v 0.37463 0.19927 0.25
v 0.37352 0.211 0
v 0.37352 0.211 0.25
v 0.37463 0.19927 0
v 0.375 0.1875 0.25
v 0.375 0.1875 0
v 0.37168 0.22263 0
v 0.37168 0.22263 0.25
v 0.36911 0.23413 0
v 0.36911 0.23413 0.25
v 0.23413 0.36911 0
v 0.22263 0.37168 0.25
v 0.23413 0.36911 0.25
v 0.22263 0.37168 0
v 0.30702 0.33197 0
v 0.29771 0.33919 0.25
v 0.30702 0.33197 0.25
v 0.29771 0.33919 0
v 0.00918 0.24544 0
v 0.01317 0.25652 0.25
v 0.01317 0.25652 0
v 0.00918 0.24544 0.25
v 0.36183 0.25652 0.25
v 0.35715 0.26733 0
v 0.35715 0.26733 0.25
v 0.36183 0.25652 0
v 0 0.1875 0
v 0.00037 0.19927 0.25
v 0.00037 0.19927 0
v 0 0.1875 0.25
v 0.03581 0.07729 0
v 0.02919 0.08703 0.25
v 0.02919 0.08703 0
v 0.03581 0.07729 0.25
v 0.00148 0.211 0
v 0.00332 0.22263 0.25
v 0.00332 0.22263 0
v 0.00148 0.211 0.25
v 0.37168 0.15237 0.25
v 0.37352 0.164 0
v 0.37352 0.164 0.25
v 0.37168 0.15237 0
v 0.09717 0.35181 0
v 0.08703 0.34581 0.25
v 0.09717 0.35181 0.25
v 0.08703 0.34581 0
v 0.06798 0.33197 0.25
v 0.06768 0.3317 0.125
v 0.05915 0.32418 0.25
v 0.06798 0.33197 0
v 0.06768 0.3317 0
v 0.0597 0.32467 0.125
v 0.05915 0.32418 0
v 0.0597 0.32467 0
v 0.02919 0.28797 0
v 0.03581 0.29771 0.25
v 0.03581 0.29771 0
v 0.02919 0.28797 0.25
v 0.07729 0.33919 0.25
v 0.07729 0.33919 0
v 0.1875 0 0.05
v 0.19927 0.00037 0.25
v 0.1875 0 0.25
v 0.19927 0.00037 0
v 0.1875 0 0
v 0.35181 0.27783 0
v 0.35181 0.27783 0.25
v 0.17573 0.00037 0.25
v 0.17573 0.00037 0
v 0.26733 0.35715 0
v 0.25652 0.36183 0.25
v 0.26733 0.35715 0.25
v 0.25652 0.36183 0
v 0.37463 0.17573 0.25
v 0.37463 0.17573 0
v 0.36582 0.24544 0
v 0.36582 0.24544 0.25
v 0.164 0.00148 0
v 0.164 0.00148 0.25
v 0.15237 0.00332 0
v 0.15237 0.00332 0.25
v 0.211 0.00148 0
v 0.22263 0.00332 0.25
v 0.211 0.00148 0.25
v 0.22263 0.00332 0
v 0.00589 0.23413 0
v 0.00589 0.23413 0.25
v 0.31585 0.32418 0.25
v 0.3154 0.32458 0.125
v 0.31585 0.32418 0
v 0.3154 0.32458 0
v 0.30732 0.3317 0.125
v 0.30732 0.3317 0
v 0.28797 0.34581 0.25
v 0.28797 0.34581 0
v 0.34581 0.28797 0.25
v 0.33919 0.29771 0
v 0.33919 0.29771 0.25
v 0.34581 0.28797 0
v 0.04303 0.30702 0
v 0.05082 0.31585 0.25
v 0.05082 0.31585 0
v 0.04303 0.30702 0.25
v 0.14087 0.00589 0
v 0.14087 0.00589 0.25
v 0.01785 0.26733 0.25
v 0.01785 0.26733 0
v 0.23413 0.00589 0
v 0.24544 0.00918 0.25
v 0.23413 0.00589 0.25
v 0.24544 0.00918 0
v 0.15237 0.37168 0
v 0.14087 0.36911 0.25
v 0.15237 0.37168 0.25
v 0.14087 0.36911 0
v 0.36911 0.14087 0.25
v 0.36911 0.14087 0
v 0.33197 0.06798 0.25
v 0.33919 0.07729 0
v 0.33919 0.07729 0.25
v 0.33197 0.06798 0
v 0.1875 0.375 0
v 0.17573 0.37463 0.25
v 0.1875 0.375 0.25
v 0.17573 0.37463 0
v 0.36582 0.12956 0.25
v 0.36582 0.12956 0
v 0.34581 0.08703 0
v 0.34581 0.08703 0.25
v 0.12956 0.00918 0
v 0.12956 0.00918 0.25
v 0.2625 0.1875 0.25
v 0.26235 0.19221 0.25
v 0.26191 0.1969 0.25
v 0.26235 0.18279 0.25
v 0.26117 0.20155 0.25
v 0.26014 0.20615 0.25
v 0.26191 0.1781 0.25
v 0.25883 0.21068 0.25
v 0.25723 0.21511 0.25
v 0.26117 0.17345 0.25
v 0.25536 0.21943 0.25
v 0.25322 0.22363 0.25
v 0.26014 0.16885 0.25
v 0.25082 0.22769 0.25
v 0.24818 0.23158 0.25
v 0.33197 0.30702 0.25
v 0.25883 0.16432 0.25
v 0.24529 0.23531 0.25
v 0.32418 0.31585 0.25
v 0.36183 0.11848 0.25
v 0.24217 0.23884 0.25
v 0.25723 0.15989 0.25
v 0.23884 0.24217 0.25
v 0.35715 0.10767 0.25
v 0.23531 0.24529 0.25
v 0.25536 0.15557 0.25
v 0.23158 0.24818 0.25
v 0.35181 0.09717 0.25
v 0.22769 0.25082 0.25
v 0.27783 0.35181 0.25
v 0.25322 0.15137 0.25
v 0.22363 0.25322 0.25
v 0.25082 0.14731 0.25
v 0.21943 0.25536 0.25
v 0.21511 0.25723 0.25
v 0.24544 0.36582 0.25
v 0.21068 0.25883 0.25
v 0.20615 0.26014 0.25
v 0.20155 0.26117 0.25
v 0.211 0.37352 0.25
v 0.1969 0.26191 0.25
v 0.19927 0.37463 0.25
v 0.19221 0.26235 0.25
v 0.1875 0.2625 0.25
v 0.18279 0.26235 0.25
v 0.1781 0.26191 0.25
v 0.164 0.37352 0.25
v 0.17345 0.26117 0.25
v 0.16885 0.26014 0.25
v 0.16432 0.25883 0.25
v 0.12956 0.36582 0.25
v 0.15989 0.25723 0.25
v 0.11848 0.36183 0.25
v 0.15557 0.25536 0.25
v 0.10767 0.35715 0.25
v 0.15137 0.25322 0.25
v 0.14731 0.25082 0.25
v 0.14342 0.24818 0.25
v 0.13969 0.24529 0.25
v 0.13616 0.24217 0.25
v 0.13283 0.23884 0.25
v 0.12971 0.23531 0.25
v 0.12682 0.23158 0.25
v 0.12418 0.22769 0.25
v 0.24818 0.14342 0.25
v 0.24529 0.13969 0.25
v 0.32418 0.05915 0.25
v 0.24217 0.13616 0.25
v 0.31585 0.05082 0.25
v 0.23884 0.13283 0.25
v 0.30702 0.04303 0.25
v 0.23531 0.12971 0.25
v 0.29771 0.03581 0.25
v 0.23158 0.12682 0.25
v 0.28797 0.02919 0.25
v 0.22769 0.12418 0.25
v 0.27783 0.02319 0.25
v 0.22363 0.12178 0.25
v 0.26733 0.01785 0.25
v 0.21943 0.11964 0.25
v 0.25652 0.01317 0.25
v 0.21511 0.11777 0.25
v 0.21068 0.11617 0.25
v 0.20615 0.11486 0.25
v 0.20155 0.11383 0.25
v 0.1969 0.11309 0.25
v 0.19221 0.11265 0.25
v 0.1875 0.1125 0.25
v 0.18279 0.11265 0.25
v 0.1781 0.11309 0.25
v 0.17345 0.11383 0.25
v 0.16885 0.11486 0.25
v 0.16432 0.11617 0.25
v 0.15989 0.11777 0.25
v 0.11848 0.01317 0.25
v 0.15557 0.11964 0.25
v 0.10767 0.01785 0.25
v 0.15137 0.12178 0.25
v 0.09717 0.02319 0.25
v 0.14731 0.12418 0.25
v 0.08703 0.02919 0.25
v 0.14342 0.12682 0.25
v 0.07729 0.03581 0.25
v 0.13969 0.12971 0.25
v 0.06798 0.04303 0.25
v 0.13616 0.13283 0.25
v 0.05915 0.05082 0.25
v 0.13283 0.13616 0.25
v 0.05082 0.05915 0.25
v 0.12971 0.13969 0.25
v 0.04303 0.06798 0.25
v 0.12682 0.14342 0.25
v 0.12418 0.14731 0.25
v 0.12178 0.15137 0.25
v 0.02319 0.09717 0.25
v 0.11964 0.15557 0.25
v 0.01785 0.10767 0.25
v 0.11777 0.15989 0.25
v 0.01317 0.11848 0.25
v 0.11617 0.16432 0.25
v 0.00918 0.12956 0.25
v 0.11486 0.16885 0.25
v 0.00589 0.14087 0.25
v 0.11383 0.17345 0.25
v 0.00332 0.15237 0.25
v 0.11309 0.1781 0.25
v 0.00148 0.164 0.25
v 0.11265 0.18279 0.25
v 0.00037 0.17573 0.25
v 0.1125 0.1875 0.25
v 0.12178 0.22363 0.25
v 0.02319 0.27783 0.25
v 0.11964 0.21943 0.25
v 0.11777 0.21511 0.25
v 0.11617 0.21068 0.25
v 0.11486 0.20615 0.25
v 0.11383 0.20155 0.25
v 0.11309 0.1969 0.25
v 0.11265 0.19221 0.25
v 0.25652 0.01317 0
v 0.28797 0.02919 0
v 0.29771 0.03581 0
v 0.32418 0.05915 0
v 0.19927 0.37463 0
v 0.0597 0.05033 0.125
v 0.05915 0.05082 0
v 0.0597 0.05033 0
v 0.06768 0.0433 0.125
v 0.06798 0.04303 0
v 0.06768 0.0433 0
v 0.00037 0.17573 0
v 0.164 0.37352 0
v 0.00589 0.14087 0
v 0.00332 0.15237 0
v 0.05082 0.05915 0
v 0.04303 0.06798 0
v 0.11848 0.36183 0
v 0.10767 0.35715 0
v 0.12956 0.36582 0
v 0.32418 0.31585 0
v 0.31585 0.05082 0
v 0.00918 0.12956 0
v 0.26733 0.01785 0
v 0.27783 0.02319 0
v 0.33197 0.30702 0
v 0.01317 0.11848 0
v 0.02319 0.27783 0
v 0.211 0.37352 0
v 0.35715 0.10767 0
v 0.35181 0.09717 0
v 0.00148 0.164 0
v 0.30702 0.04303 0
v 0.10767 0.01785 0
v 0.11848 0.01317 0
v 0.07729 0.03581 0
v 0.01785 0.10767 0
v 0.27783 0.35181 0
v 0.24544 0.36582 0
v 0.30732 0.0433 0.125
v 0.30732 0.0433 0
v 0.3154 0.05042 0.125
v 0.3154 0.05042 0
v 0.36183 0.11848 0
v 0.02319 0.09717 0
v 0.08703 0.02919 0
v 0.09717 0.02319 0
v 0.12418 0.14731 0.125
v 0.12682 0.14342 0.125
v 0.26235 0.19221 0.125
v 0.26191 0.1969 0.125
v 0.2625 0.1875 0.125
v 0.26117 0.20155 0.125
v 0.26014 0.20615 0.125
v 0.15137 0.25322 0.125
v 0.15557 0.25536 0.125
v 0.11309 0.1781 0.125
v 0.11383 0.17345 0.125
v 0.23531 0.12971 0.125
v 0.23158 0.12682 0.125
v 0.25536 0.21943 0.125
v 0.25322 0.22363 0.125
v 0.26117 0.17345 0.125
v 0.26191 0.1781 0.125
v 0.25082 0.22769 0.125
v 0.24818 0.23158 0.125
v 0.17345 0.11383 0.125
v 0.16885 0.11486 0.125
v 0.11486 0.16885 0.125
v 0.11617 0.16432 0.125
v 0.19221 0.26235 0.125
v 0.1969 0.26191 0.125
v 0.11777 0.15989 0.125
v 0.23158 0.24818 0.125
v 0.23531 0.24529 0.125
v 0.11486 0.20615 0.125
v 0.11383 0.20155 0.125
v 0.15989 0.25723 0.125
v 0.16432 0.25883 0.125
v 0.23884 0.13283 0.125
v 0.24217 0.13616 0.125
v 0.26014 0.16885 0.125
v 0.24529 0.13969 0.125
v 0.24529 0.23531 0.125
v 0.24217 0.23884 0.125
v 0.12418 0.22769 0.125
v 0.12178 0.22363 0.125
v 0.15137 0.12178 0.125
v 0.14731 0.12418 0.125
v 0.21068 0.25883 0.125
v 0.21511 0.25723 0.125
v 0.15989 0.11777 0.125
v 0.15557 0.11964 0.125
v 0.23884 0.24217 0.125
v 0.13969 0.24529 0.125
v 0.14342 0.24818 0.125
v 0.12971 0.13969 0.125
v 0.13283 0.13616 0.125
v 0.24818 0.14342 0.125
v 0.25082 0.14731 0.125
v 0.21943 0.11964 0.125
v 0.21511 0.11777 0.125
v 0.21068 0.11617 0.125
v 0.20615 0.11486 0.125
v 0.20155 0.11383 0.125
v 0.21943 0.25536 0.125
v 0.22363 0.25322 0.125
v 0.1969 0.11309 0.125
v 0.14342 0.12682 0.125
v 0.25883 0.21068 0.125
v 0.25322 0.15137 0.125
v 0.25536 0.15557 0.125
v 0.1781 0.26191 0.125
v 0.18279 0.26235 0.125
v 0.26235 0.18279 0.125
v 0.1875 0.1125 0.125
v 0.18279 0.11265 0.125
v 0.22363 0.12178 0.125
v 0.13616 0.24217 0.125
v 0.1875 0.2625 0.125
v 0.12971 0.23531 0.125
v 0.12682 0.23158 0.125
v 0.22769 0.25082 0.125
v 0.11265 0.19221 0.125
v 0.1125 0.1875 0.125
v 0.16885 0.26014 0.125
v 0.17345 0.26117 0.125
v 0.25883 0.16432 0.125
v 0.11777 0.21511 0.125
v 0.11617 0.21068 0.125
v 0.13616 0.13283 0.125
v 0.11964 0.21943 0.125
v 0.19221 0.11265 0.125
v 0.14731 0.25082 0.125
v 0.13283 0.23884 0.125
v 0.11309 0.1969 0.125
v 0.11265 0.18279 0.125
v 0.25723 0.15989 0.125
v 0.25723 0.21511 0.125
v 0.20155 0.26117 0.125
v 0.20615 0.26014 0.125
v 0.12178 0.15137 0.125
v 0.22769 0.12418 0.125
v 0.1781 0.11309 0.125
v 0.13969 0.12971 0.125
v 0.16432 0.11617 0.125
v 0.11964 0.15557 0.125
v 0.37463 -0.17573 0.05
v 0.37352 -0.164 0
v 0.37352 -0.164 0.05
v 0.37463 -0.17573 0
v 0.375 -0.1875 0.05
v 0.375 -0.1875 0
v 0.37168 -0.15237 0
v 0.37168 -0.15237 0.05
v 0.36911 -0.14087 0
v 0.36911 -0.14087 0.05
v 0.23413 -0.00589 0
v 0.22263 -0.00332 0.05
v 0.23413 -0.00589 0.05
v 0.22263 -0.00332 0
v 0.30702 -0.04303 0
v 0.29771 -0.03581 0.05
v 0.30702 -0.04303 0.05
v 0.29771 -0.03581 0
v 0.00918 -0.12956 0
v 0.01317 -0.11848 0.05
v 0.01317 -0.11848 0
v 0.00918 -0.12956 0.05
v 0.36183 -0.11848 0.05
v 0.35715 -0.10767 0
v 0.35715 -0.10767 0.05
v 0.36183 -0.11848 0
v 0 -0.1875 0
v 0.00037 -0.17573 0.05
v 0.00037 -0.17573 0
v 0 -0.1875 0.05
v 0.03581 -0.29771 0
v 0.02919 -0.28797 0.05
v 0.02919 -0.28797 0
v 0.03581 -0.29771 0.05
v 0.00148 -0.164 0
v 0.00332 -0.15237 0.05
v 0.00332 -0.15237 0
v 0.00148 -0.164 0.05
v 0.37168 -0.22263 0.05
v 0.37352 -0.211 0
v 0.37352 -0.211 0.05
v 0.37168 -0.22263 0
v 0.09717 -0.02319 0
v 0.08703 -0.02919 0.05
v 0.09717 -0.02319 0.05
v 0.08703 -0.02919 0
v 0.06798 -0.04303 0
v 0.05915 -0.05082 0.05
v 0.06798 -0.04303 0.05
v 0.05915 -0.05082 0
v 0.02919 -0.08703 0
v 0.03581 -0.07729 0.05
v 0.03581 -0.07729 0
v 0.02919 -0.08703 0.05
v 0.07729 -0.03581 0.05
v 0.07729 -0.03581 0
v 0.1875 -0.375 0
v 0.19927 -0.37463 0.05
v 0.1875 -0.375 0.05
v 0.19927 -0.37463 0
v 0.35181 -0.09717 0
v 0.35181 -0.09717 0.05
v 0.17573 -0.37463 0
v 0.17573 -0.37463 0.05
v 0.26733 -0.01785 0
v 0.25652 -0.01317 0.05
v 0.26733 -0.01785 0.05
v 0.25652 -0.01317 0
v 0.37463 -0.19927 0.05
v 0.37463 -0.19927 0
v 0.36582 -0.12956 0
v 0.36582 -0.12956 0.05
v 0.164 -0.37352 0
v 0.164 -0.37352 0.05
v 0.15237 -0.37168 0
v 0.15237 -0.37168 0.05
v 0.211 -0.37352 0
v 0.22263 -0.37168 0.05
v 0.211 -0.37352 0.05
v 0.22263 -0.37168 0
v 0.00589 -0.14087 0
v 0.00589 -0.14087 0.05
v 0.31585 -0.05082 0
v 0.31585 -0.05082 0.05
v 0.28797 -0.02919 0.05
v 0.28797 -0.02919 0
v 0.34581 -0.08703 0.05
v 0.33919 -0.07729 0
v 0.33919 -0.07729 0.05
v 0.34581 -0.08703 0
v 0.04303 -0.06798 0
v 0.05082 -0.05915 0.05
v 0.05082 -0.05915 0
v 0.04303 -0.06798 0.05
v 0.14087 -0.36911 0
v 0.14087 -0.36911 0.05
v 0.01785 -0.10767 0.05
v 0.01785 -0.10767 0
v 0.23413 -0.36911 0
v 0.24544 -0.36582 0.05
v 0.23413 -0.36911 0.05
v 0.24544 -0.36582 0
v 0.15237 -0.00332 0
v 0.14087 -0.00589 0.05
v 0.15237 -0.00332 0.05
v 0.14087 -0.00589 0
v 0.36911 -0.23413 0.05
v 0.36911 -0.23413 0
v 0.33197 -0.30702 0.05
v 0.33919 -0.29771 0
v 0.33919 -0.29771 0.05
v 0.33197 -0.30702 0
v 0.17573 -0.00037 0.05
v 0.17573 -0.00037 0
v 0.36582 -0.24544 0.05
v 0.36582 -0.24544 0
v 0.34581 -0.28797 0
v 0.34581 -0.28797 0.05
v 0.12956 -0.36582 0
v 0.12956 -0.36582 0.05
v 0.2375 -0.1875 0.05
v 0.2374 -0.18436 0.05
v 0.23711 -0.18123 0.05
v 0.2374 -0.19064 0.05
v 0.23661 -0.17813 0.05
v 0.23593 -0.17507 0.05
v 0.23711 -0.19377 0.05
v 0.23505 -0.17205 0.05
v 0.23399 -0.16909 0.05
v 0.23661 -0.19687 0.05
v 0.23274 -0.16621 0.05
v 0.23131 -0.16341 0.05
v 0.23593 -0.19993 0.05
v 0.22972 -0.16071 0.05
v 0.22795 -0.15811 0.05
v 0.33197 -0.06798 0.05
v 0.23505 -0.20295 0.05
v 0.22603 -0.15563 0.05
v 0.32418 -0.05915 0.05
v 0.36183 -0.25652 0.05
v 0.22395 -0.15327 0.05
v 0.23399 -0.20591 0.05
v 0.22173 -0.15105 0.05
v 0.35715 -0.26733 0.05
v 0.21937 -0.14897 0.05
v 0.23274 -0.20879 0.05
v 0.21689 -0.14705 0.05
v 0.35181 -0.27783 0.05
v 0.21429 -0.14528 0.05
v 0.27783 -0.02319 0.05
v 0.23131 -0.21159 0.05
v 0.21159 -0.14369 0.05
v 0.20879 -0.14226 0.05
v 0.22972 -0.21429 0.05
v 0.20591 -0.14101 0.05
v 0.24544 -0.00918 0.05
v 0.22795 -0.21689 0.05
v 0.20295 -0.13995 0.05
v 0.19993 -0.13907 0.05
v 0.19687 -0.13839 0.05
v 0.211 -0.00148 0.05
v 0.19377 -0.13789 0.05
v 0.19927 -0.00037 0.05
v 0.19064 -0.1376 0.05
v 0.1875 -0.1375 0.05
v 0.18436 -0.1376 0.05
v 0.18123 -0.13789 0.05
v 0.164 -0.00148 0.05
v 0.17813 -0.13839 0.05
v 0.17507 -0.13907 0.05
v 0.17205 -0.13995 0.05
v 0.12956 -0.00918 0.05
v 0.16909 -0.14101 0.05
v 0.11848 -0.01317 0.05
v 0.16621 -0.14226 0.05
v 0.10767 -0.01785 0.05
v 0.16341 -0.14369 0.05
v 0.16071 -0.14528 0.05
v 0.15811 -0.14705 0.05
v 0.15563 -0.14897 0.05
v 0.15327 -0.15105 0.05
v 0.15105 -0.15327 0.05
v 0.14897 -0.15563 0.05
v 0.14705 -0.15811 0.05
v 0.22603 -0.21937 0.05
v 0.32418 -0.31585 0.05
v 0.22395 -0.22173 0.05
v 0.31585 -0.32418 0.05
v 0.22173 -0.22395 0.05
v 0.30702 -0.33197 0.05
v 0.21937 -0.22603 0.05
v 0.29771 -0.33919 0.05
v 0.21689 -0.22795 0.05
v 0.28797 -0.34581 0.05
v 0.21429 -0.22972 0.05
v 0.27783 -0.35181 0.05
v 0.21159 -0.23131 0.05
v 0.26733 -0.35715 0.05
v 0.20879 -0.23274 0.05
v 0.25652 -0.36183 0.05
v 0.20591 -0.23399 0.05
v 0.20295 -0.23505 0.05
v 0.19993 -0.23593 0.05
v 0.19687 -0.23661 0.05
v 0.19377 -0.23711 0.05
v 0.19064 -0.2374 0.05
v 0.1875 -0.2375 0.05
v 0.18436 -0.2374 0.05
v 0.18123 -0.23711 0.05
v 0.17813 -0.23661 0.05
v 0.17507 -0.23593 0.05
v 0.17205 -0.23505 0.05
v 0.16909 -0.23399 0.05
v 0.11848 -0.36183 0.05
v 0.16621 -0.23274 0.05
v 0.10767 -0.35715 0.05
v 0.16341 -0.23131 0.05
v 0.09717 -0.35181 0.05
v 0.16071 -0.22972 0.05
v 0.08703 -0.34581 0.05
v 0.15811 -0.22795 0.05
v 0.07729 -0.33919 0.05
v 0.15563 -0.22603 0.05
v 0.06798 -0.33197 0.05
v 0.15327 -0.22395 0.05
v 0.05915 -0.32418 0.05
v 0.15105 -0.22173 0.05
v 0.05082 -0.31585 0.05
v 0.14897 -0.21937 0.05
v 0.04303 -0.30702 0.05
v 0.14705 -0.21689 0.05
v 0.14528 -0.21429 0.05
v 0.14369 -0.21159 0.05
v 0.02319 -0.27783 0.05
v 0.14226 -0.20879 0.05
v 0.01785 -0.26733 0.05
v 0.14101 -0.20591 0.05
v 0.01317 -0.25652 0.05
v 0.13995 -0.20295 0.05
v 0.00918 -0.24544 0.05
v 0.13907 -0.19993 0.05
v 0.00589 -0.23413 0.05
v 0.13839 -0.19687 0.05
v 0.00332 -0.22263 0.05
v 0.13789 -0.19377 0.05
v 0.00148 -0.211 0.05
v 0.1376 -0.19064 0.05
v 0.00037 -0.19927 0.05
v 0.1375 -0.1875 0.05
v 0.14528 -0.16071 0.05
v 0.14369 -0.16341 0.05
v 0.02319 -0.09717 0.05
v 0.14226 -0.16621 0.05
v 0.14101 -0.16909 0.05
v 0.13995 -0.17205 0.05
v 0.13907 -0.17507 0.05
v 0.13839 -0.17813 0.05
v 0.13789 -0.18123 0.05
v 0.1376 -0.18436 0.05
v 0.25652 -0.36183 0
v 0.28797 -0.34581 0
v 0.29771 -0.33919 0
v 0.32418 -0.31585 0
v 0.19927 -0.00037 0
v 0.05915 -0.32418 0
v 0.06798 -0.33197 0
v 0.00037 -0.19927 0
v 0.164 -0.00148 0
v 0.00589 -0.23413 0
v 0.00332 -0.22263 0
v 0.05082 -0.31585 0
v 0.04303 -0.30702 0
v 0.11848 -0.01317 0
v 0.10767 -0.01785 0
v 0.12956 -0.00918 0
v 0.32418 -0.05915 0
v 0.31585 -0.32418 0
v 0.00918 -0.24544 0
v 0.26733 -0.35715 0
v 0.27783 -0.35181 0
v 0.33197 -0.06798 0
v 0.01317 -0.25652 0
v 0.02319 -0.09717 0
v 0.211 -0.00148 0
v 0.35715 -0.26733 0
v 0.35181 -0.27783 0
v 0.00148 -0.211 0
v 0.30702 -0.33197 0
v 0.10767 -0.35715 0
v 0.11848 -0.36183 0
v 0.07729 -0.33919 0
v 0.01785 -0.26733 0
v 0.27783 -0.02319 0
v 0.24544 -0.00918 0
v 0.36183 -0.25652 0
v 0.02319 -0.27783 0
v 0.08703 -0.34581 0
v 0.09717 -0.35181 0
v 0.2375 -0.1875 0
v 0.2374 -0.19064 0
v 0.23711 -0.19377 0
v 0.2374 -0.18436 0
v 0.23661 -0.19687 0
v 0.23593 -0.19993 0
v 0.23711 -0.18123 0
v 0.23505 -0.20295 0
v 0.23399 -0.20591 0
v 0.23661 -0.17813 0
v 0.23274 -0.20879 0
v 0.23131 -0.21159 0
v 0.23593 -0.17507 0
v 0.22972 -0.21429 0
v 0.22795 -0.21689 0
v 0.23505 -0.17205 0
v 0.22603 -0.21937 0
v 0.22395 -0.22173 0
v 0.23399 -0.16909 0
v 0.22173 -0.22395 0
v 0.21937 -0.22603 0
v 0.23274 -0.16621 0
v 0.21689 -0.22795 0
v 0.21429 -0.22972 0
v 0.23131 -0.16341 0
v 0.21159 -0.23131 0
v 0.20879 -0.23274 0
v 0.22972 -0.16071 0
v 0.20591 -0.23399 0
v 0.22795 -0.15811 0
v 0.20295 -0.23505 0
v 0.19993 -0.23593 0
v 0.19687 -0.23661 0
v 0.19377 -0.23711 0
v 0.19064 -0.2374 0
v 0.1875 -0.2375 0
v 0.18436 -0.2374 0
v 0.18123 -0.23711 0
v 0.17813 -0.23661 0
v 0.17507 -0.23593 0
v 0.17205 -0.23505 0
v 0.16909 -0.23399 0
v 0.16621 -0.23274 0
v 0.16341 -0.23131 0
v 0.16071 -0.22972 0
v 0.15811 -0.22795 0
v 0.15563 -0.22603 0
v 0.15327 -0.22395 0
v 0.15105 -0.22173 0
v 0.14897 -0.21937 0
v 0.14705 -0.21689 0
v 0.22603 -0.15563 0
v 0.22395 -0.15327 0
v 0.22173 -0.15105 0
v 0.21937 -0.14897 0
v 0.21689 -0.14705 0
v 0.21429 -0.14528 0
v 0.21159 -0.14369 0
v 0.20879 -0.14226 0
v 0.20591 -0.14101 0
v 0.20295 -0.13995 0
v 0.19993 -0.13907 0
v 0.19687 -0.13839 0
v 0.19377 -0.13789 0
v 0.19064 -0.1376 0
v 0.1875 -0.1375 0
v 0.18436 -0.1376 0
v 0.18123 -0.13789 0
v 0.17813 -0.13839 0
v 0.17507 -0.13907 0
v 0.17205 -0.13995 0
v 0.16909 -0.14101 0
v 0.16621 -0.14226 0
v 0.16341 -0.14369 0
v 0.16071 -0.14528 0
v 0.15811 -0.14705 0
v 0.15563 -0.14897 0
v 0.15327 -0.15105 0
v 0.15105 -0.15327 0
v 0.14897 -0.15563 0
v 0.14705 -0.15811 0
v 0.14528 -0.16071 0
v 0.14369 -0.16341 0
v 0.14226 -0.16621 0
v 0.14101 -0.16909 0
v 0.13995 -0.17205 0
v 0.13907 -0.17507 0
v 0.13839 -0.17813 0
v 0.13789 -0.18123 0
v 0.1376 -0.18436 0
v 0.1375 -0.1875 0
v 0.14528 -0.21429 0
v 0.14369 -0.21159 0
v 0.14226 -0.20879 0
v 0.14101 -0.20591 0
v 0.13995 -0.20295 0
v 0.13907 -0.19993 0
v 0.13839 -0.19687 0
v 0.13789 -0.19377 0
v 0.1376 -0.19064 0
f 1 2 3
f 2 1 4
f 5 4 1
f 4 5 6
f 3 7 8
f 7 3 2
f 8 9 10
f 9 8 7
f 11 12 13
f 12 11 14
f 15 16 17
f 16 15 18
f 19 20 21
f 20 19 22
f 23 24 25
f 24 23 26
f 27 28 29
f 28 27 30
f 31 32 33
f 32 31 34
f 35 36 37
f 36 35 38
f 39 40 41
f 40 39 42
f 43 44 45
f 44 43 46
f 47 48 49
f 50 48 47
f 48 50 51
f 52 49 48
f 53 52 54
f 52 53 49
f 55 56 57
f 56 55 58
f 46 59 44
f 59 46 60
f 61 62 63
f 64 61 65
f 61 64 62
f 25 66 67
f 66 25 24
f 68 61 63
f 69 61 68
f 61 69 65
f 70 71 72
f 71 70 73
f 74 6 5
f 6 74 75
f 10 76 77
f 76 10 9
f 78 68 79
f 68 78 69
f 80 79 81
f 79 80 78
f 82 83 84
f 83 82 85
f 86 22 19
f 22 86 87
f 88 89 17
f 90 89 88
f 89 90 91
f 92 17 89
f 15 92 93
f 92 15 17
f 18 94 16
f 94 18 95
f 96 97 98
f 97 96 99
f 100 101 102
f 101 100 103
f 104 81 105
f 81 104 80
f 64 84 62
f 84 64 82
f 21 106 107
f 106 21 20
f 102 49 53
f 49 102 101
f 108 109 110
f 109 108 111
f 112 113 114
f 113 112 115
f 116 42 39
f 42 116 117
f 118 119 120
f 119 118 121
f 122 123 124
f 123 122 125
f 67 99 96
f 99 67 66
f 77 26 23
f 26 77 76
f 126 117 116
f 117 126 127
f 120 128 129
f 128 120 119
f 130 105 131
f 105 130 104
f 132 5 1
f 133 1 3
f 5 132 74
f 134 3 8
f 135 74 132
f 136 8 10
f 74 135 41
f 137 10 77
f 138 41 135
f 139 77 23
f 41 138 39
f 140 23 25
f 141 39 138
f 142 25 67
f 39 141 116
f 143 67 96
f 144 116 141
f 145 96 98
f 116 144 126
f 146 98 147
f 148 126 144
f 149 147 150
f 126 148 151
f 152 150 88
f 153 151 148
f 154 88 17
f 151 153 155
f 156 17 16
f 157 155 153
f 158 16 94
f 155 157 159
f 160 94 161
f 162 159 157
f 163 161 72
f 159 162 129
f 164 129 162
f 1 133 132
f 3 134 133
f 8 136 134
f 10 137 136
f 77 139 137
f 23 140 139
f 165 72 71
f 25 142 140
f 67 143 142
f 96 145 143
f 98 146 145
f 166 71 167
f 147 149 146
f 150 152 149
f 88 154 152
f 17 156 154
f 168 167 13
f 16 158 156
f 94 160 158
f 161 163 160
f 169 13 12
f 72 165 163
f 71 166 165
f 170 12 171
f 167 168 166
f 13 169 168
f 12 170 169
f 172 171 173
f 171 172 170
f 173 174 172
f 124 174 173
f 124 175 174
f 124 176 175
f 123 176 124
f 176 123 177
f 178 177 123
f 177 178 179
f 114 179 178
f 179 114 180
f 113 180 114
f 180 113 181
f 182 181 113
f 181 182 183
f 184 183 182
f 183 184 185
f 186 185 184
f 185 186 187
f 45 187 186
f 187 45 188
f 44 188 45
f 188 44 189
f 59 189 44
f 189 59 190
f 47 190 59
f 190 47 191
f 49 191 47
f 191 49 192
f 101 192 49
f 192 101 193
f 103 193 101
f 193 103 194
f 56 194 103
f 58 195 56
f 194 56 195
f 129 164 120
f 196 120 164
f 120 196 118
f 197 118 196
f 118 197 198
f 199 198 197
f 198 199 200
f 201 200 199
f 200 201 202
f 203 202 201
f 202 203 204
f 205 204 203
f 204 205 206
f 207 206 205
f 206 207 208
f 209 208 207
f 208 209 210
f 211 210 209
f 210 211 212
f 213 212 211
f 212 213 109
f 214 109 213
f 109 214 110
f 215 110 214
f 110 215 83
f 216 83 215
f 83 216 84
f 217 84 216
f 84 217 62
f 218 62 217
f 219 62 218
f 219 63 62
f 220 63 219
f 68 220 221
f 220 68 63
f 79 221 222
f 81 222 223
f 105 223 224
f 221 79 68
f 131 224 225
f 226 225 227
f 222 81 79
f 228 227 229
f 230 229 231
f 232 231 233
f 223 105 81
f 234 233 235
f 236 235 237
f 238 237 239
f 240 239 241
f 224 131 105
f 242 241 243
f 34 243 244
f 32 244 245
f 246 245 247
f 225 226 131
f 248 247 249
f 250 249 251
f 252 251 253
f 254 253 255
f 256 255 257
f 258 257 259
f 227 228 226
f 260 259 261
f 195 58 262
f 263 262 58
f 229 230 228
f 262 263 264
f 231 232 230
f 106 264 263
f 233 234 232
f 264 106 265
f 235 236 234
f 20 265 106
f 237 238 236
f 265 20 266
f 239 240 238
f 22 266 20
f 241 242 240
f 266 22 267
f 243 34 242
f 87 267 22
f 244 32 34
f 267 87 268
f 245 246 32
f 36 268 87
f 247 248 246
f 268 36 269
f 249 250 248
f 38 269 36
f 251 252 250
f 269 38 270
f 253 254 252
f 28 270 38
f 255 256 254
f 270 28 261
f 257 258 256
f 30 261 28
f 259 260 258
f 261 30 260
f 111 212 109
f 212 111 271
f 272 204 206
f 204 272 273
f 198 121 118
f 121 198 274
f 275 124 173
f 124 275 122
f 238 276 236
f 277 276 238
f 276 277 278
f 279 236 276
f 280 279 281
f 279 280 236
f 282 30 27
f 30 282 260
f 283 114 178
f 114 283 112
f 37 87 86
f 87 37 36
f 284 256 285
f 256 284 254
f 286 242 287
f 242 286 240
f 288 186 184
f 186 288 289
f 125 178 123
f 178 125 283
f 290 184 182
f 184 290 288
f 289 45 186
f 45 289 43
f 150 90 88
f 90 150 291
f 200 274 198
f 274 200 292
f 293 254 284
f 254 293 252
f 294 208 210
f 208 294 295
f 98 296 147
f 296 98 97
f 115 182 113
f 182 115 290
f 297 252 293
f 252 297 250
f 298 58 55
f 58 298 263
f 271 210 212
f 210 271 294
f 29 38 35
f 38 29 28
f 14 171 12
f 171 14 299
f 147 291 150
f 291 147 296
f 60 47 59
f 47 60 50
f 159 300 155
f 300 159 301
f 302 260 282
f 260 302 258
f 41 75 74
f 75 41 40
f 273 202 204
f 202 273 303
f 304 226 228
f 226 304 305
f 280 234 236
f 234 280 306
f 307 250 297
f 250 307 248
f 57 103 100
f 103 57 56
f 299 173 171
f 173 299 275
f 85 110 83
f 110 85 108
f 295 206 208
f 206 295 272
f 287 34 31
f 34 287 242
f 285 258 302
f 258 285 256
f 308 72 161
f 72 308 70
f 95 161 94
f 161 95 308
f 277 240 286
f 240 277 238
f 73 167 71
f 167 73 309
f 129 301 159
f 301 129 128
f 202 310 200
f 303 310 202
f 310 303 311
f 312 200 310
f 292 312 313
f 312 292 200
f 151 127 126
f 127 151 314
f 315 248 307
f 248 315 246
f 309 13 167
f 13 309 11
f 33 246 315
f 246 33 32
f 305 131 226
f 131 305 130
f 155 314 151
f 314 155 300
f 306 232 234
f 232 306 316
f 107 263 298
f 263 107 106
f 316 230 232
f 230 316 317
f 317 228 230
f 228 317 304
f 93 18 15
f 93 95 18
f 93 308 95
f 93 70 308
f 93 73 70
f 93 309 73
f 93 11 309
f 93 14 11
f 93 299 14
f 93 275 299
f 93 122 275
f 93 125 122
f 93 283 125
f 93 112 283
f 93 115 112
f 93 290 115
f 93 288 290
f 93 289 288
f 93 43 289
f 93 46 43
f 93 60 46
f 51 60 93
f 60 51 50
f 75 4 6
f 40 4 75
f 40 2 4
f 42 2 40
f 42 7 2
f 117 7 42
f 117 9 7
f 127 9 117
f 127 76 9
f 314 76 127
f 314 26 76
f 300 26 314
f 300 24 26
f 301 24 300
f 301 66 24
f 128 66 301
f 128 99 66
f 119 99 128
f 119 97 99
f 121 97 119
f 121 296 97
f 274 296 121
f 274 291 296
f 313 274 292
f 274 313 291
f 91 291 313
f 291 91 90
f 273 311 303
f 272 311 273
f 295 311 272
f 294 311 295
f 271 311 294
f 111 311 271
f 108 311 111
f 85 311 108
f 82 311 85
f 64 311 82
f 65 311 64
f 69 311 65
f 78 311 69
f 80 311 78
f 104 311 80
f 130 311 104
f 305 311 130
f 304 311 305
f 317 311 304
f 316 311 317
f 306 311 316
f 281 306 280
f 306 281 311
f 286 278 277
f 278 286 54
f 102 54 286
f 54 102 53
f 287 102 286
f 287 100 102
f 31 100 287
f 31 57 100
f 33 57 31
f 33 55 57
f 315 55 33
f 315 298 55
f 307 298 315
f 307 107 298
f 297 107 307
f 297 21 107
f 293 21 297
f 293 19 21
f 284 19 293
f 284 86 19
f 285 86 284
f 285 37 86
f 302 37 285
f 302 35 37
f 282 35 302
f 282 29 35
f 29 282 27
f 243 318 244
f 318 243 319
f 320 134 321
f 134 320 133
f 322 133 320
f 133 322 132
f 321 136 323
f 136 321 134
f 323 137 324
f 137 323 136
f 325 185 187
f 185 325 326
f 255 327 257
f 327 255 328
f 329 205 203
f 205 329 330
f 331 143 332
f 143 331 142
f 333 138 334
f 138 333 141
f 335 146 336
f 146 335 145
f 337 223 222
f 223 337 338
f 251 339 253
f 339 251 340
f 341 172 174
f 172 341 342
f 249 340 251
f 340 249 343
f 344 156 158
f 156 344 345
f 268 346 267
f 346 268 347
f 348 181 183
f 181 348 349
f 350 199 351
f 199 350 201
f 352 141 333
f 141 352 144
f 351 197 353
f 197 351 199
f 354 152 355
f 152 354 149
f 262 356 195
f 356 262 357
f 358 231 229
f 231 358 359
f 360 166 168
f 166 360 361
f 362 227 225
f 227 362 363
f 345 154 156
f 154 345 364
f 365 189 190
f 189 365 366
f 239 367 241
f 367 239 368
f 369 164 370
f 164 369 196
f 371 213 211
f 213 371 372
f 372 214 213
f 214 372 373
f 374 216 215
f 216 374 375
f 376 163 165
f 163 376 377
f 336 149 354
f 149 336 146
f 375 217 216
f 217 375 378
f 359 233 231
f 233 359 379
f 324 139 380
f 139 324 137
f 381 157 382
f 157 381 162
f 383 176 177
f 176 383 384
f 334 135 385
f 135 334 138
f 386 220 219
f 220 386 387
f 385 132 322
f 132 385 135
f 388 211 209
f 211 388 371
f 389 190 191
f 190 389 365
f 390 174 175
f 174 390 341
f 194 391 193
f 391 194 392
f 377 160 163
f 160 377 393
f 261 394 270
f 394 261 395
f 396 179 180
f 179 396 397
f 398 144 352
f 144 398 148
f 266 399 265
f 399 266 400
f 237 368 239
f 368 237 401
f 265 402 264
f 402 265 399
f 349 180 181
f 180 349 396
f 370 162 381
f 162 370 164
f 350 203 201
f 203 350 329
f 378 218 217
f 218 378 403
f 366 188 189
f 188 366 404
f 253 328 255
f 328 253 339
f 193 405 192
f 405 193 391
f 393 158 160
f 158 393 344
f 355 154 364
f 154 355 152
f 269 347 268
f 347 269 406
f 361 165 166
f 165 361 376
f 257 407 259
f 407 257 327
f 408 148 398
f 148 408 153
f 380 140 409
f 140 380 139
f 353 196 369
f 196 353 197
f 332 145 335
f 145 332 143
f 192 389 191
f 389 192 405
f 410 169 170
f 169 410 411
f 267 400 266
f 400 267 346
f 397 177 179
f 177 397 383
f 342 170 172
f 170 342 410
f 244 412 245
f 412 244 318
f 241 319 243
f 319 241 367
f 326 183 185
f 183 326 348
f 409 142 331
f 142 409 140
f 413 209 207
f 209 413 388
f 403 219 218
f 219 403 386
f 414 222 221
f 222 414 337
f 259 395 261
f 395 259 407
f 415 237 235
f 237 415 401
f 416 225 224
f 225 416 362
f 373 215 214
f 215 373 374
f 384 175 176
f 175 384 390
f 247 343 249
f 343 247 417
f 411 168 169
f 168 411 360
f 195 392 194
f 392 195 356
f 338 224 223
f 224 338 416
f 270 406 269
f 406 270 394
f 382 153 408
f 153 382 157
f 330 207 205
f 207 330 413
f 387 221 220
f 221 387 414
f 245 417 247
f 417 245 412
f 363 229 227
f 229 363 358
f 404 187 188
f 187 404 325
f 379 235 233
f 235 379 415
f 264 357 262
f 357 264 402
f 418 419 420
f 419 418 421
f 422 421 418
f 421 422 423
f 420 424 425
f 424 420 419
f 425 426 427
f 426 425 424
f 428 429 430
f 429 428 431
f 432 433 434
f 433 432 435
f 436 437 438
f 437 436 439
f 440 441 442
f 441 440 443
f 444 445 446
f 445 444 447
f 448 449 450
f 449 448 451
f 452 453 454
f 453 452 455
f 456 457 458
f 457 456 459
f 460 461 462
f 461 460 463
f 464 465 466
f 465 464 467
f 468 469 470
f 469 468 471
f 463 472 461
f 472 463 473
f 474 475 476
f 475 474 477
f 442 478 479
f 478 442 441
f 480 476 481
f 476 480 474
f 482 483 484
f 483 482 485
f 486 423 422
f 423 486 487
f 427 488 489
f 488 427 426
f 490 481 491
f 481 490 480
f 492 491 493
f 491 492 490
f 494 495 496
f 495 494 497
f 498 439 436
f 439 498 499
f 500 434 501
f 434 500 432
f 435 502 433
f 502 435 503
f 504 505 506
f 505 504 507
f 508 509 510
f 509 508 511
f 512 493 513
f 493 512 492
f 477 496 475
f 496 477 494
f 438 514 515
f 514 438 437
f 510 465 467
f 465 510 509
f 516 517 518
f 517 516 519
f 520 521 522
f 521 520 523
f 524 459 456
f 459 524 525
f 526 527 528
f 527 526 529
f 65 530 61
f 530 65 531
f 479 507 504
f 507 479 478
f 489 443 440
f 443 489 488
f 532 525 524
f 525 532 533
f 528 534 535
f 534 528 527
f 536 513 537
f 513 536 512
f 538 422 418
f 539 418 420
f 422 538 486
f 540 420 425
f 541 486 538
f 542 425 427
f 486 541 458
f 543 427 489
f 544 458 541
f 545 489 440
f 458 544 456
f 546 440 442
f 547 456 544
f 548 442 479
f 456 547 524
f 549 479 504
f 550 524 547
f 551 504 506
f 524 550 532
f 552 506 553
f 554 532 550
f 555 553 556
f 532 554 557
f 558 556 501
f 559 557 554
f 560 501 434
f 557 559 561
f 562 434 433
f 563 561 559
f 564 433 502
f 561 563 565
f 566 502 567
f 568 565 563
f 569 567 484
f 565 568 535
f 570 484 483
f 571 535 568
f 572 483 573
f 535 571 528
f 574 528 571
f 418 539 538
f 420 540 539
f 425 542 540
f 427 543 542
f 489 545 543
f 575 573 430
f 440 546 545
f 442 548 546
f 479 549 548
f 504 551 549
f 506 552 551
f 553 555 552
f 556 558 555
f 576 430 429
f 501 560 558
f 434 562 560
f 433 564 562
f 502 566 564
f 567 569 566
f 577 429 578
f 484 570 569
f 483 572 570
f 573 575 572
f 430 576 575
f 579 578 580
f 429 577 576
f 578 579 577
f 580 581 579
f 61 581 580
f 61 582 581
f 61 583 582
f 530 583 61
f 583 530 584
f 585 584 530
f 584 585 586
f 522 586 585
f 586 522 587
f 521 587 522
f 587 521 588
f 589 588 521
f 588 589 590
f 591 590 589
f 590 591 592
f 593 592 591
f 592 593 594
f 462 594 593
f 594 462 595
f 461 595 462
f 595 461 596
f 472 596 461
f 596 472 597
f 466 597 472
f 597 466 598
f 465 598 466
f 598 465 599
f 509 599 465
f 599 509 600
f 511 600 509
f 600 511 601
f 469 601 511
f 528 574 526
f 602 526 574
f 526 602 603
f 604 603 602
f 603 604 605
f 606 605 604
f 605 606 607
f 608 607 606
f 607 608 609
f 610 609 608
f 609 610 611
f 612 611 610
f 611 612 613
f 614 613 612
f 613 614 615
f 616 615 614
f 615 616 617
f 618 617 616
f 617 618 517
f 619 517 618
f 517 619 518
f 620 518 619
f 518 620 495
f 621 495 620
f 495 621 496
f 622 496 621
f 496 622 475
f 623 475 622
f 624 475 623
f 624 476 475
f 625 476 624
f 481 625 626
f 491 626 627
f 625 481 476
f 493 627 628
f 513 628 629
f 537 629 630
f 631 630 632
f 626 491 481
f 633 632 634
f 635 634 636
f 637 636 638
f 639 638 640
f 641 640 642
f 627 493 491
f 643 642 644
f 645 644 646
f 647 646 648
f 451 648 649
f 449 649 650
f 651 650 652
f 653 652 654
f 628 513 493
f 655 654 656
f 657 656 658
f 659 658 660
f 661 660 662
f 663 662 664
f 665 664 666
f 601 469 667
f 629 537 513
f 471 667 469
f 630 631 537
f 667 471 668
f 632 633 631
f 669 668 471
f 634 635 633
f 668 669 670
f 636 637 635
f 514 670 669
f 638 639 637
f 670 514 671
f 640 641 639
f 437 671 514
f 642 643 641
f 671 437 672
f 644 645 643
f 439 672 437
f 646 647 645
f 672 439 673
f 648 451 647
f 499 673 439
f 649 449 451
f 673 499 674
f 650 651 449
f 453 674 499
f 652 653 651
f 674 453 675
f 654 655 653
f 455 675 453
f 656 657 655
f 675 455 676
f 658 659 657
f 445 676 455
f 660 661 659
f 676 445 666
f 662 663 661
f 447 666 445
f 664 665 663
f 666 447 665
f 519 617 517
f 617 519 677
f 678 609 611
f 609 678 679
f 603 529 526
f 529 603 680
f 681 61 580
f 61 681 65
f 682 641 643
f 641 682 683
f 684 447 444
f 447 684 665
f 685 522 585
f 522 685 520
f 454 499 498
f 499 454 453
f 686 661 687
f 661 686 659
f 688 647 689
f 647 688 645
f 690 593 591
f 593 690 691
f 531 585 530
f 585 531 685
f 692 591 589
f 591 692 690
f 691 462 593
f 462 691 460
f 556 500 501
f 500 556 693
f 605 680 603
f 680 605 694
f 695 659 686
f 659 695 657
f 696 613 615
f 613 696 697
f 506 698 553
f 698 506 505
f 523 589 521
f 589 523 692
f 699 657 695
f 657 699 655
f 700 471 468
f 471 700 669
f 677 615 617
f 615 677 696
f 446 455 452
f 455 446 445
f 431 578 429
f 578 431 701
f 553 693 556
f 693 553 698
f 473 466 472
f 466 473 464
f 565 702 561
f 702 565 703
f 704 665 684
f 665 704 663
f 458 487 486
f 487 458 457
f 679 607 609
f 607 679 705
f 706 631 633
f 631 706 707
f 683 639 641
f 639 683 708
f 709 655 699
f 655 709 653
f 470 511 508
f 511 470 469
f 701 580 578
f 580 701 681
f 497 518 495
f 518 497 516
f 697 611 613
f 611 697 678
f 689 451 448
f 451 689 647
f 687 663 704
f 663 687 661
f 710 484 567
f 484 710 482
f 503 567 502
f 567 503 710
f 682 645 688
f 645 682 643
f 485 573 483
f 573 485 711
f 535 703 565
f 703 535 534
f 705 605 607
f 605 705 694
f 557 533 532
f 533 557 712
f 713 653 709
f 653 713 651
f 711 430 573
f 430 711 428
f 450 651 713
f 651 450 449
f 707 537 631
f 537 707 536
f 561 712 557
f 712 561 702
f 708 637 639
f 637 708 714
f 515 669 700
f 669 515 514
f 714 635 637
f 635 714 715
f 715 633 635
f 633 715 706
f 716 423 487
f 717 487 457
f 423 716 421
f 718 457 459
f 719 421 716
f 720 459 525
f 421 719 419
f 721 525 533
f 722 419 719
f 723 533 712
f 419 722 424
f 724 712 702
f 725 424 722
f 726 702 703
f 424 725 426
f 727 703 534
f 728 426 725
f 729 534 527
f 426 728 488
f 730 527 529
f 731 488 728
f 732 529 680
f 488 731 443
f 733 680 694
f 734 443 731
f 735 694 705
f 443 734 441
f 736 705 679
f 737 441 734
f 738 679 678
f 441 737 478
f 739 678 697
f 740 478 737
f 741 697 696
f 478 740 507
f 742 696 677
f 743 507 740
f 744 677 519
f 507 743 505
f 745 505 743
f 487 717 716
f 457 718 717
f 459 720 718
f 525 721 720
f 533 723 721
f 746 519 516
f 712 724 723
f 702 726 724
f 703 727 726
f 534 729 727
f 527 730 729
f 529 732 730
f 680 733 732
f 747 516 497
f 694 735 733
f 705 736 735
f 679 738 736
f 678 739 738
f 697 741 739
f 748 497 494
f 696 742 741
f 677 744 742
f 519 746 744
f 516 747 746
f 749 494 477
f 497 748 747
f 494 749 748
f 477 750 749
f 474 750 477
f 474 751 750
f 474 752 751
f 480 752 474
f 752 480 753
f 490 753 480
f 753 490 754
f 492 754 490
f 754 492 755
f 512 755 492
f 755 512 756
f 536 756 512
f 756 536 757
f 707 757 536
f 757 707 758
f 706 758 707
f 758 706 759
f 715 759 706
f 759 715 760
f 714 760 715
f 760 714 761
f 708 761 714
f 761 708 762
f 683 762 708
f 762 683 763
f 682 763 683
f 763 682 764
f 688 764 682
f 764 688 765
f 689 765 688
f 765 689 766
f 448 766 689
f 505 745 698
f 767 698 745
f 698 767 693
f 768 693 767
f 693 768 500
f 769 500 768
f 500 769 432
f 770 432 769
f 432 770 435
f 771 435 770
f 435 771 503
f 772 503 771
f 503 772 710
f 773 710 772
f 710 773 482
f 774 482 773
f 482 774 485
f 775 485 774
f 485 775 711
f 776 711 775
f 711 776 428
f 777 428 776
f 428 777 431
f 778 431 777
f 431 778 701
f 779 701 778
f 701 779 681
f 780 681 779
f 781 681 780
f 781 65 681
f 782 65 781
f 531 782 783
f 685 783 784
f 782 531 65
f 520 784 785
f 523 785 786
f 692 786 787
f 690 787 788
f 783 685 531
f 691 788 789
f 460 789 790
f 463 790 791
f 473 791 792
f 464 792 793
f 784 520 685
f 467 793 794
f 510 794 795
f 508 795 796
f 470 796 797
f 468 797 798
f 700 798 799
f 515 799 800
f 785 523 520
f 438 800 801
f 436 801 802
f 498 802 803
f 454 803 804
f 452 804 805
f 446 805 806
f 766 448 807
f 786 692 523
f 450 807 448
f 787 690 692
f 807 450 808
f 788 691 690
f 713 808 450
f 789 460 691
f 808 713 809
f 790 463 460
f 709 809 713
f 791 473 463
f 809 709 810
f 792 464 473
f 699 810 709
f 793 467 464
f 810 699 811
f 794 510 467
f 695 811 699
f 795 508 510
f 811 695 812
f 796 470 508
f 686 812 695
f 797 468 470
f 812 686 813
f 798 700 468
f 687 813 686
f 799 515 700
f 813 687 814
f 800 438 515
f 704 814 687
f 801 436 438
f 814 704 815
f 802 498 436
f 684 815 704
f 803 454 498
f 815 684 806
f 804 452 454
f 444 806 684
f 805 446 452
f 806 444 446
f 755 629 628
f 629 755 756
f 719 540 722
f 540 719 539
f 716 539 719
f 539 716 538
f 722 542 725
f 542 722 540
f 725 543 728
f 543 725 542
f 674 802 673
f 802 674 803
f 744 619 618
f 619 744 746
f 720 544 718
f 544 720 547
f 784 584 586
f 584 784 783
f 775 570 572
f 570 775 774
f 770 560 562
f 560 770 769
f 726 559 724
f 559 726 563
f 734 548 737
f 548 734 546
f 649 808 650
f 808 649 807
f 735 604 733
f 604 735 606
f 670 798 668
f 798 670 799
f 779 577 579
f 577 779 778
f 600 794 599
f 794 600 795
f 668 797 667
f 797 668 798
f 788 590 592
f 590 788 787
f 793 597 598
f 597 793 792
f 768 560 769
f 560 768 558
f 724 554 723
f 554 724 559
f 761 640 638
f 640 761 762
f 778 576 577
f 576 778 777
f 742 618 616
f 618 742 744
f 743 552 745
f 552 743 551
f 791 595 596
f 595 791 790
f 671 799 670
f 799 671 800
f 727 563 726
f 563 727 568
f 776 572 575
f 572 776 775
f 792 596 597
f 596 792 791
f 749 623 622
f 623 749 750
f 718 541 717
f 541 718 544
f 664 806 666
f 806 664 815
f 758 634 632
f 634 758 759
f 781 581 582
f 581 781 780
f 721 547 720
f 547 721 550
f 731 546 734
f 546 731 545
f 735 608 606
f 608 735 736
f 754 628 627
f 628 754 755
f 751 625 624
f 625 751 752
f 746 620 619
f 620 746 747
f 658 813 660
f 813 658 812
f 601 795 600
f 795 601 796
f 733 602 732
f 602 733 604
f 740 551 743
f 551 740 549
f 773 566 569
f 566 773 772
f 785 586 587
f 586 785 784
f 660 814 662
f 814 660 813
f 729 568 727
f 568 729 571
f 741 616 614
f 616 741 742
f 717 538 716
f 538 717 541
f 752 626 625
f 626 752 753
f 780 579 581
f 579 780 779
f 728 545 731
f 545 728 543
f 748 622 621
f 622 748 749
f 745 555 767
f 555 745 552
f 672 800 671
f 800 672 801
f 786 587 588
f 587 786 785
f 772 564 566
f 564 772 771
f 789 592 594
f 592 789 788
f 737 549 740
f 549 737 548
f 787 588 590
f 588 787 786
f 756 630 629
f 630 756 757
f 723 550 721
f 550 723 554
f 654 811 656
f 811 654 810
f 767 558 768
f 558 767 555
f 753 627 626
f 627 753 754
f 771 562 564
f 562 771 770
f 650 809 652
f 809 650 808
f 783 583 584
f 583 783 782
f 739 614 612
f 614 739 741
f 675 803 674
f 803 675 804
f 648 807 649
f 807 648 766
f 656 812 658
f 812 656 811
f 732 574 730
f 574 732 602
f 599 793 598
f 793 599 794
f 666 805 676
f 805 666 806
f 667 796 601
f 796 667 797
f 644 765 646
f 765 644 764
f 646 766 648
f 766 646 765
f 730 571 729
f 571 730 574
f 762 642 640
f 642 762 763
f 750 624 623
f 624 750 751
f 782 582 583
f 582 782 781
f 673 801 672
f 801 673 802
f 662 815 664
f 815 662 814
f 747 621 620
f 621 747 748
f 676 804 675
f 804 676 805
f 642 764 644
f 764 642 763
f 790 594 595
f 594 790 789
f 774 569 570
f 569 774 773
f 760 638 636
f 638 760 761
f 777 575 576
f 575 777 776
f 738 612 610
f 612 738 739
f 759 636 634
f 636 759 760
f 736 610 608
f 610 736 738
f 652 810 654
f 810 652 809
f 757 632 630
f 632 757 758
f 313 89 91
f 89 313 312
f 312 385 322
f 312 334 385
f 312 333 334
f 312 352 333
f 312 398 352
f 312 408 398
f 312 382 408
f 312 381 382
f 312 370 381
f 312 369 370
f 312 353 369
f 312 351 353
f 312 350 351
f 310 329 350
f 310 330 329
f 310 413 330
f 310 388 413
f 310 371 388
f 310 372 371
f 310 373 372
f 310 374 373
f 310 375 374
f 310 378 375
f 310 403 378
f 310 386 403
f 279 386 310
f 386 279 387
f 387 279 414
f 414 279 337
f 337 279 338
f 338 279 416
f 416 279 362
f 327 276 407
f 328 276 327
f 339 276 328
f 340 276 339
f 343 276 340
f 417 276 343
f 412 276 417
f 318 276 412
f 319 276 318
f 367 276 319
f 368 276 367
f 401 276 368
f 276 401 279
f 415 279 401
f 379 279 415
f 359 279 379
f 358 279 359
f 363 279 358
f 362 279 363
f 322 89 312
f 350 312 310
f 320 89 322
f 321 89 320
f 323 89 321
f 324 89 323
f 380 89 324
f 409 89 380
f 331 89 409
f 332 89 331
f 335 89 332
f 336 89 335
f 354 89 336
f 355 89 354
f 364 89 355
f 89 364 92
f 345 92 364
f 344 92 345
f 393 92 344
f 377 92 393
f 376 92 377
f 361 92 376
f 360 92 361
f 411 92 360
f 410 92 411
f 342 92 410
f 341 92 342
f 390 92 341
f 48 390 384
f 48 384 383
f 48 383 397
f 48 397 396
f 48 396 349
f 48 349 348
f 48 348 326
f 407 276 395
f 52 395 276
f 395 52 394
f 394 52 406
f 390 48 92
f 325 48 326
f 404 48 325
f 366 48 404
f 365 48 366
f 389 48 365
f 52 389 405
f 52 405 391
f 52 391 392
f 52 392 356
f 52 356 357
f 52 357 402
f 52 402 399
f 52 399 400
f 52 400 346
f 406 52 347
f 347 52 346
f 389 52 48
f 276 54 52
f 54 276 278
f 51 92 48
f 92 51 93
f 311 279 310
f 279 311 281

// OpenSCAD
// Main reference footprint
length = 0.375;
width = 0.375;
height = 0.25;

// Main annular cylinder parameters
main_ctr_x = 0.1875;
main_ctr_y = 0.1875;
main_outer_r = 0.1875;
main_bore_r = 0.075;

// Shallow attached tab parameters
tab_height = 0.05;
tab_ctr_y = -0.1875; // 0.1875 from front edge in negative direction
tab_outer_r = 0.1875;
tab_bore_r = 0.05;

// Underside recess parameters
recess_height = 0.125;
recess_x = 0.0597;
recess_y = 0.0433;
recess_w = 0.2557;
recess_d = 0.2884;

// Resolution for small curved features
$fn = 100;

// Main sleeve: tall annular cylinder on underside datum
module main_sleeve() {
    translate([main_ctr_x, main_ctr_y, 0])
    difference() {
        cylinder(h = height, r = main_outer_r);
        // Central through bore
        cylinder(h = height, r = main_bore_r);
    }
}

// Shallow tab: short annular cylinder attached to front of main sleeve
module shallow_tab() {
    translate([main_ctr_x, tab_ctr_y, 0])
    difference() {
        cylinder(h = tab_height, r = tab_outer_r);
        // Centered through opening
        cylinder(h = tab_height, r = tab_bore_r);
    }
}

// Underside recess: rectangular pocket cut into bottom of main sleeve,
// centered on main axis, leaving the central bore wall intact
module underside_recess() {
    translate([recess_x, recess_y, 0])
        cube([recess_w, recess_d, recess_height]);
}

// Combine solids and subtract recess
difference() {
    union() {
        main_sleeve();
        shallow_tab();
    }
    underside_recess();
}
